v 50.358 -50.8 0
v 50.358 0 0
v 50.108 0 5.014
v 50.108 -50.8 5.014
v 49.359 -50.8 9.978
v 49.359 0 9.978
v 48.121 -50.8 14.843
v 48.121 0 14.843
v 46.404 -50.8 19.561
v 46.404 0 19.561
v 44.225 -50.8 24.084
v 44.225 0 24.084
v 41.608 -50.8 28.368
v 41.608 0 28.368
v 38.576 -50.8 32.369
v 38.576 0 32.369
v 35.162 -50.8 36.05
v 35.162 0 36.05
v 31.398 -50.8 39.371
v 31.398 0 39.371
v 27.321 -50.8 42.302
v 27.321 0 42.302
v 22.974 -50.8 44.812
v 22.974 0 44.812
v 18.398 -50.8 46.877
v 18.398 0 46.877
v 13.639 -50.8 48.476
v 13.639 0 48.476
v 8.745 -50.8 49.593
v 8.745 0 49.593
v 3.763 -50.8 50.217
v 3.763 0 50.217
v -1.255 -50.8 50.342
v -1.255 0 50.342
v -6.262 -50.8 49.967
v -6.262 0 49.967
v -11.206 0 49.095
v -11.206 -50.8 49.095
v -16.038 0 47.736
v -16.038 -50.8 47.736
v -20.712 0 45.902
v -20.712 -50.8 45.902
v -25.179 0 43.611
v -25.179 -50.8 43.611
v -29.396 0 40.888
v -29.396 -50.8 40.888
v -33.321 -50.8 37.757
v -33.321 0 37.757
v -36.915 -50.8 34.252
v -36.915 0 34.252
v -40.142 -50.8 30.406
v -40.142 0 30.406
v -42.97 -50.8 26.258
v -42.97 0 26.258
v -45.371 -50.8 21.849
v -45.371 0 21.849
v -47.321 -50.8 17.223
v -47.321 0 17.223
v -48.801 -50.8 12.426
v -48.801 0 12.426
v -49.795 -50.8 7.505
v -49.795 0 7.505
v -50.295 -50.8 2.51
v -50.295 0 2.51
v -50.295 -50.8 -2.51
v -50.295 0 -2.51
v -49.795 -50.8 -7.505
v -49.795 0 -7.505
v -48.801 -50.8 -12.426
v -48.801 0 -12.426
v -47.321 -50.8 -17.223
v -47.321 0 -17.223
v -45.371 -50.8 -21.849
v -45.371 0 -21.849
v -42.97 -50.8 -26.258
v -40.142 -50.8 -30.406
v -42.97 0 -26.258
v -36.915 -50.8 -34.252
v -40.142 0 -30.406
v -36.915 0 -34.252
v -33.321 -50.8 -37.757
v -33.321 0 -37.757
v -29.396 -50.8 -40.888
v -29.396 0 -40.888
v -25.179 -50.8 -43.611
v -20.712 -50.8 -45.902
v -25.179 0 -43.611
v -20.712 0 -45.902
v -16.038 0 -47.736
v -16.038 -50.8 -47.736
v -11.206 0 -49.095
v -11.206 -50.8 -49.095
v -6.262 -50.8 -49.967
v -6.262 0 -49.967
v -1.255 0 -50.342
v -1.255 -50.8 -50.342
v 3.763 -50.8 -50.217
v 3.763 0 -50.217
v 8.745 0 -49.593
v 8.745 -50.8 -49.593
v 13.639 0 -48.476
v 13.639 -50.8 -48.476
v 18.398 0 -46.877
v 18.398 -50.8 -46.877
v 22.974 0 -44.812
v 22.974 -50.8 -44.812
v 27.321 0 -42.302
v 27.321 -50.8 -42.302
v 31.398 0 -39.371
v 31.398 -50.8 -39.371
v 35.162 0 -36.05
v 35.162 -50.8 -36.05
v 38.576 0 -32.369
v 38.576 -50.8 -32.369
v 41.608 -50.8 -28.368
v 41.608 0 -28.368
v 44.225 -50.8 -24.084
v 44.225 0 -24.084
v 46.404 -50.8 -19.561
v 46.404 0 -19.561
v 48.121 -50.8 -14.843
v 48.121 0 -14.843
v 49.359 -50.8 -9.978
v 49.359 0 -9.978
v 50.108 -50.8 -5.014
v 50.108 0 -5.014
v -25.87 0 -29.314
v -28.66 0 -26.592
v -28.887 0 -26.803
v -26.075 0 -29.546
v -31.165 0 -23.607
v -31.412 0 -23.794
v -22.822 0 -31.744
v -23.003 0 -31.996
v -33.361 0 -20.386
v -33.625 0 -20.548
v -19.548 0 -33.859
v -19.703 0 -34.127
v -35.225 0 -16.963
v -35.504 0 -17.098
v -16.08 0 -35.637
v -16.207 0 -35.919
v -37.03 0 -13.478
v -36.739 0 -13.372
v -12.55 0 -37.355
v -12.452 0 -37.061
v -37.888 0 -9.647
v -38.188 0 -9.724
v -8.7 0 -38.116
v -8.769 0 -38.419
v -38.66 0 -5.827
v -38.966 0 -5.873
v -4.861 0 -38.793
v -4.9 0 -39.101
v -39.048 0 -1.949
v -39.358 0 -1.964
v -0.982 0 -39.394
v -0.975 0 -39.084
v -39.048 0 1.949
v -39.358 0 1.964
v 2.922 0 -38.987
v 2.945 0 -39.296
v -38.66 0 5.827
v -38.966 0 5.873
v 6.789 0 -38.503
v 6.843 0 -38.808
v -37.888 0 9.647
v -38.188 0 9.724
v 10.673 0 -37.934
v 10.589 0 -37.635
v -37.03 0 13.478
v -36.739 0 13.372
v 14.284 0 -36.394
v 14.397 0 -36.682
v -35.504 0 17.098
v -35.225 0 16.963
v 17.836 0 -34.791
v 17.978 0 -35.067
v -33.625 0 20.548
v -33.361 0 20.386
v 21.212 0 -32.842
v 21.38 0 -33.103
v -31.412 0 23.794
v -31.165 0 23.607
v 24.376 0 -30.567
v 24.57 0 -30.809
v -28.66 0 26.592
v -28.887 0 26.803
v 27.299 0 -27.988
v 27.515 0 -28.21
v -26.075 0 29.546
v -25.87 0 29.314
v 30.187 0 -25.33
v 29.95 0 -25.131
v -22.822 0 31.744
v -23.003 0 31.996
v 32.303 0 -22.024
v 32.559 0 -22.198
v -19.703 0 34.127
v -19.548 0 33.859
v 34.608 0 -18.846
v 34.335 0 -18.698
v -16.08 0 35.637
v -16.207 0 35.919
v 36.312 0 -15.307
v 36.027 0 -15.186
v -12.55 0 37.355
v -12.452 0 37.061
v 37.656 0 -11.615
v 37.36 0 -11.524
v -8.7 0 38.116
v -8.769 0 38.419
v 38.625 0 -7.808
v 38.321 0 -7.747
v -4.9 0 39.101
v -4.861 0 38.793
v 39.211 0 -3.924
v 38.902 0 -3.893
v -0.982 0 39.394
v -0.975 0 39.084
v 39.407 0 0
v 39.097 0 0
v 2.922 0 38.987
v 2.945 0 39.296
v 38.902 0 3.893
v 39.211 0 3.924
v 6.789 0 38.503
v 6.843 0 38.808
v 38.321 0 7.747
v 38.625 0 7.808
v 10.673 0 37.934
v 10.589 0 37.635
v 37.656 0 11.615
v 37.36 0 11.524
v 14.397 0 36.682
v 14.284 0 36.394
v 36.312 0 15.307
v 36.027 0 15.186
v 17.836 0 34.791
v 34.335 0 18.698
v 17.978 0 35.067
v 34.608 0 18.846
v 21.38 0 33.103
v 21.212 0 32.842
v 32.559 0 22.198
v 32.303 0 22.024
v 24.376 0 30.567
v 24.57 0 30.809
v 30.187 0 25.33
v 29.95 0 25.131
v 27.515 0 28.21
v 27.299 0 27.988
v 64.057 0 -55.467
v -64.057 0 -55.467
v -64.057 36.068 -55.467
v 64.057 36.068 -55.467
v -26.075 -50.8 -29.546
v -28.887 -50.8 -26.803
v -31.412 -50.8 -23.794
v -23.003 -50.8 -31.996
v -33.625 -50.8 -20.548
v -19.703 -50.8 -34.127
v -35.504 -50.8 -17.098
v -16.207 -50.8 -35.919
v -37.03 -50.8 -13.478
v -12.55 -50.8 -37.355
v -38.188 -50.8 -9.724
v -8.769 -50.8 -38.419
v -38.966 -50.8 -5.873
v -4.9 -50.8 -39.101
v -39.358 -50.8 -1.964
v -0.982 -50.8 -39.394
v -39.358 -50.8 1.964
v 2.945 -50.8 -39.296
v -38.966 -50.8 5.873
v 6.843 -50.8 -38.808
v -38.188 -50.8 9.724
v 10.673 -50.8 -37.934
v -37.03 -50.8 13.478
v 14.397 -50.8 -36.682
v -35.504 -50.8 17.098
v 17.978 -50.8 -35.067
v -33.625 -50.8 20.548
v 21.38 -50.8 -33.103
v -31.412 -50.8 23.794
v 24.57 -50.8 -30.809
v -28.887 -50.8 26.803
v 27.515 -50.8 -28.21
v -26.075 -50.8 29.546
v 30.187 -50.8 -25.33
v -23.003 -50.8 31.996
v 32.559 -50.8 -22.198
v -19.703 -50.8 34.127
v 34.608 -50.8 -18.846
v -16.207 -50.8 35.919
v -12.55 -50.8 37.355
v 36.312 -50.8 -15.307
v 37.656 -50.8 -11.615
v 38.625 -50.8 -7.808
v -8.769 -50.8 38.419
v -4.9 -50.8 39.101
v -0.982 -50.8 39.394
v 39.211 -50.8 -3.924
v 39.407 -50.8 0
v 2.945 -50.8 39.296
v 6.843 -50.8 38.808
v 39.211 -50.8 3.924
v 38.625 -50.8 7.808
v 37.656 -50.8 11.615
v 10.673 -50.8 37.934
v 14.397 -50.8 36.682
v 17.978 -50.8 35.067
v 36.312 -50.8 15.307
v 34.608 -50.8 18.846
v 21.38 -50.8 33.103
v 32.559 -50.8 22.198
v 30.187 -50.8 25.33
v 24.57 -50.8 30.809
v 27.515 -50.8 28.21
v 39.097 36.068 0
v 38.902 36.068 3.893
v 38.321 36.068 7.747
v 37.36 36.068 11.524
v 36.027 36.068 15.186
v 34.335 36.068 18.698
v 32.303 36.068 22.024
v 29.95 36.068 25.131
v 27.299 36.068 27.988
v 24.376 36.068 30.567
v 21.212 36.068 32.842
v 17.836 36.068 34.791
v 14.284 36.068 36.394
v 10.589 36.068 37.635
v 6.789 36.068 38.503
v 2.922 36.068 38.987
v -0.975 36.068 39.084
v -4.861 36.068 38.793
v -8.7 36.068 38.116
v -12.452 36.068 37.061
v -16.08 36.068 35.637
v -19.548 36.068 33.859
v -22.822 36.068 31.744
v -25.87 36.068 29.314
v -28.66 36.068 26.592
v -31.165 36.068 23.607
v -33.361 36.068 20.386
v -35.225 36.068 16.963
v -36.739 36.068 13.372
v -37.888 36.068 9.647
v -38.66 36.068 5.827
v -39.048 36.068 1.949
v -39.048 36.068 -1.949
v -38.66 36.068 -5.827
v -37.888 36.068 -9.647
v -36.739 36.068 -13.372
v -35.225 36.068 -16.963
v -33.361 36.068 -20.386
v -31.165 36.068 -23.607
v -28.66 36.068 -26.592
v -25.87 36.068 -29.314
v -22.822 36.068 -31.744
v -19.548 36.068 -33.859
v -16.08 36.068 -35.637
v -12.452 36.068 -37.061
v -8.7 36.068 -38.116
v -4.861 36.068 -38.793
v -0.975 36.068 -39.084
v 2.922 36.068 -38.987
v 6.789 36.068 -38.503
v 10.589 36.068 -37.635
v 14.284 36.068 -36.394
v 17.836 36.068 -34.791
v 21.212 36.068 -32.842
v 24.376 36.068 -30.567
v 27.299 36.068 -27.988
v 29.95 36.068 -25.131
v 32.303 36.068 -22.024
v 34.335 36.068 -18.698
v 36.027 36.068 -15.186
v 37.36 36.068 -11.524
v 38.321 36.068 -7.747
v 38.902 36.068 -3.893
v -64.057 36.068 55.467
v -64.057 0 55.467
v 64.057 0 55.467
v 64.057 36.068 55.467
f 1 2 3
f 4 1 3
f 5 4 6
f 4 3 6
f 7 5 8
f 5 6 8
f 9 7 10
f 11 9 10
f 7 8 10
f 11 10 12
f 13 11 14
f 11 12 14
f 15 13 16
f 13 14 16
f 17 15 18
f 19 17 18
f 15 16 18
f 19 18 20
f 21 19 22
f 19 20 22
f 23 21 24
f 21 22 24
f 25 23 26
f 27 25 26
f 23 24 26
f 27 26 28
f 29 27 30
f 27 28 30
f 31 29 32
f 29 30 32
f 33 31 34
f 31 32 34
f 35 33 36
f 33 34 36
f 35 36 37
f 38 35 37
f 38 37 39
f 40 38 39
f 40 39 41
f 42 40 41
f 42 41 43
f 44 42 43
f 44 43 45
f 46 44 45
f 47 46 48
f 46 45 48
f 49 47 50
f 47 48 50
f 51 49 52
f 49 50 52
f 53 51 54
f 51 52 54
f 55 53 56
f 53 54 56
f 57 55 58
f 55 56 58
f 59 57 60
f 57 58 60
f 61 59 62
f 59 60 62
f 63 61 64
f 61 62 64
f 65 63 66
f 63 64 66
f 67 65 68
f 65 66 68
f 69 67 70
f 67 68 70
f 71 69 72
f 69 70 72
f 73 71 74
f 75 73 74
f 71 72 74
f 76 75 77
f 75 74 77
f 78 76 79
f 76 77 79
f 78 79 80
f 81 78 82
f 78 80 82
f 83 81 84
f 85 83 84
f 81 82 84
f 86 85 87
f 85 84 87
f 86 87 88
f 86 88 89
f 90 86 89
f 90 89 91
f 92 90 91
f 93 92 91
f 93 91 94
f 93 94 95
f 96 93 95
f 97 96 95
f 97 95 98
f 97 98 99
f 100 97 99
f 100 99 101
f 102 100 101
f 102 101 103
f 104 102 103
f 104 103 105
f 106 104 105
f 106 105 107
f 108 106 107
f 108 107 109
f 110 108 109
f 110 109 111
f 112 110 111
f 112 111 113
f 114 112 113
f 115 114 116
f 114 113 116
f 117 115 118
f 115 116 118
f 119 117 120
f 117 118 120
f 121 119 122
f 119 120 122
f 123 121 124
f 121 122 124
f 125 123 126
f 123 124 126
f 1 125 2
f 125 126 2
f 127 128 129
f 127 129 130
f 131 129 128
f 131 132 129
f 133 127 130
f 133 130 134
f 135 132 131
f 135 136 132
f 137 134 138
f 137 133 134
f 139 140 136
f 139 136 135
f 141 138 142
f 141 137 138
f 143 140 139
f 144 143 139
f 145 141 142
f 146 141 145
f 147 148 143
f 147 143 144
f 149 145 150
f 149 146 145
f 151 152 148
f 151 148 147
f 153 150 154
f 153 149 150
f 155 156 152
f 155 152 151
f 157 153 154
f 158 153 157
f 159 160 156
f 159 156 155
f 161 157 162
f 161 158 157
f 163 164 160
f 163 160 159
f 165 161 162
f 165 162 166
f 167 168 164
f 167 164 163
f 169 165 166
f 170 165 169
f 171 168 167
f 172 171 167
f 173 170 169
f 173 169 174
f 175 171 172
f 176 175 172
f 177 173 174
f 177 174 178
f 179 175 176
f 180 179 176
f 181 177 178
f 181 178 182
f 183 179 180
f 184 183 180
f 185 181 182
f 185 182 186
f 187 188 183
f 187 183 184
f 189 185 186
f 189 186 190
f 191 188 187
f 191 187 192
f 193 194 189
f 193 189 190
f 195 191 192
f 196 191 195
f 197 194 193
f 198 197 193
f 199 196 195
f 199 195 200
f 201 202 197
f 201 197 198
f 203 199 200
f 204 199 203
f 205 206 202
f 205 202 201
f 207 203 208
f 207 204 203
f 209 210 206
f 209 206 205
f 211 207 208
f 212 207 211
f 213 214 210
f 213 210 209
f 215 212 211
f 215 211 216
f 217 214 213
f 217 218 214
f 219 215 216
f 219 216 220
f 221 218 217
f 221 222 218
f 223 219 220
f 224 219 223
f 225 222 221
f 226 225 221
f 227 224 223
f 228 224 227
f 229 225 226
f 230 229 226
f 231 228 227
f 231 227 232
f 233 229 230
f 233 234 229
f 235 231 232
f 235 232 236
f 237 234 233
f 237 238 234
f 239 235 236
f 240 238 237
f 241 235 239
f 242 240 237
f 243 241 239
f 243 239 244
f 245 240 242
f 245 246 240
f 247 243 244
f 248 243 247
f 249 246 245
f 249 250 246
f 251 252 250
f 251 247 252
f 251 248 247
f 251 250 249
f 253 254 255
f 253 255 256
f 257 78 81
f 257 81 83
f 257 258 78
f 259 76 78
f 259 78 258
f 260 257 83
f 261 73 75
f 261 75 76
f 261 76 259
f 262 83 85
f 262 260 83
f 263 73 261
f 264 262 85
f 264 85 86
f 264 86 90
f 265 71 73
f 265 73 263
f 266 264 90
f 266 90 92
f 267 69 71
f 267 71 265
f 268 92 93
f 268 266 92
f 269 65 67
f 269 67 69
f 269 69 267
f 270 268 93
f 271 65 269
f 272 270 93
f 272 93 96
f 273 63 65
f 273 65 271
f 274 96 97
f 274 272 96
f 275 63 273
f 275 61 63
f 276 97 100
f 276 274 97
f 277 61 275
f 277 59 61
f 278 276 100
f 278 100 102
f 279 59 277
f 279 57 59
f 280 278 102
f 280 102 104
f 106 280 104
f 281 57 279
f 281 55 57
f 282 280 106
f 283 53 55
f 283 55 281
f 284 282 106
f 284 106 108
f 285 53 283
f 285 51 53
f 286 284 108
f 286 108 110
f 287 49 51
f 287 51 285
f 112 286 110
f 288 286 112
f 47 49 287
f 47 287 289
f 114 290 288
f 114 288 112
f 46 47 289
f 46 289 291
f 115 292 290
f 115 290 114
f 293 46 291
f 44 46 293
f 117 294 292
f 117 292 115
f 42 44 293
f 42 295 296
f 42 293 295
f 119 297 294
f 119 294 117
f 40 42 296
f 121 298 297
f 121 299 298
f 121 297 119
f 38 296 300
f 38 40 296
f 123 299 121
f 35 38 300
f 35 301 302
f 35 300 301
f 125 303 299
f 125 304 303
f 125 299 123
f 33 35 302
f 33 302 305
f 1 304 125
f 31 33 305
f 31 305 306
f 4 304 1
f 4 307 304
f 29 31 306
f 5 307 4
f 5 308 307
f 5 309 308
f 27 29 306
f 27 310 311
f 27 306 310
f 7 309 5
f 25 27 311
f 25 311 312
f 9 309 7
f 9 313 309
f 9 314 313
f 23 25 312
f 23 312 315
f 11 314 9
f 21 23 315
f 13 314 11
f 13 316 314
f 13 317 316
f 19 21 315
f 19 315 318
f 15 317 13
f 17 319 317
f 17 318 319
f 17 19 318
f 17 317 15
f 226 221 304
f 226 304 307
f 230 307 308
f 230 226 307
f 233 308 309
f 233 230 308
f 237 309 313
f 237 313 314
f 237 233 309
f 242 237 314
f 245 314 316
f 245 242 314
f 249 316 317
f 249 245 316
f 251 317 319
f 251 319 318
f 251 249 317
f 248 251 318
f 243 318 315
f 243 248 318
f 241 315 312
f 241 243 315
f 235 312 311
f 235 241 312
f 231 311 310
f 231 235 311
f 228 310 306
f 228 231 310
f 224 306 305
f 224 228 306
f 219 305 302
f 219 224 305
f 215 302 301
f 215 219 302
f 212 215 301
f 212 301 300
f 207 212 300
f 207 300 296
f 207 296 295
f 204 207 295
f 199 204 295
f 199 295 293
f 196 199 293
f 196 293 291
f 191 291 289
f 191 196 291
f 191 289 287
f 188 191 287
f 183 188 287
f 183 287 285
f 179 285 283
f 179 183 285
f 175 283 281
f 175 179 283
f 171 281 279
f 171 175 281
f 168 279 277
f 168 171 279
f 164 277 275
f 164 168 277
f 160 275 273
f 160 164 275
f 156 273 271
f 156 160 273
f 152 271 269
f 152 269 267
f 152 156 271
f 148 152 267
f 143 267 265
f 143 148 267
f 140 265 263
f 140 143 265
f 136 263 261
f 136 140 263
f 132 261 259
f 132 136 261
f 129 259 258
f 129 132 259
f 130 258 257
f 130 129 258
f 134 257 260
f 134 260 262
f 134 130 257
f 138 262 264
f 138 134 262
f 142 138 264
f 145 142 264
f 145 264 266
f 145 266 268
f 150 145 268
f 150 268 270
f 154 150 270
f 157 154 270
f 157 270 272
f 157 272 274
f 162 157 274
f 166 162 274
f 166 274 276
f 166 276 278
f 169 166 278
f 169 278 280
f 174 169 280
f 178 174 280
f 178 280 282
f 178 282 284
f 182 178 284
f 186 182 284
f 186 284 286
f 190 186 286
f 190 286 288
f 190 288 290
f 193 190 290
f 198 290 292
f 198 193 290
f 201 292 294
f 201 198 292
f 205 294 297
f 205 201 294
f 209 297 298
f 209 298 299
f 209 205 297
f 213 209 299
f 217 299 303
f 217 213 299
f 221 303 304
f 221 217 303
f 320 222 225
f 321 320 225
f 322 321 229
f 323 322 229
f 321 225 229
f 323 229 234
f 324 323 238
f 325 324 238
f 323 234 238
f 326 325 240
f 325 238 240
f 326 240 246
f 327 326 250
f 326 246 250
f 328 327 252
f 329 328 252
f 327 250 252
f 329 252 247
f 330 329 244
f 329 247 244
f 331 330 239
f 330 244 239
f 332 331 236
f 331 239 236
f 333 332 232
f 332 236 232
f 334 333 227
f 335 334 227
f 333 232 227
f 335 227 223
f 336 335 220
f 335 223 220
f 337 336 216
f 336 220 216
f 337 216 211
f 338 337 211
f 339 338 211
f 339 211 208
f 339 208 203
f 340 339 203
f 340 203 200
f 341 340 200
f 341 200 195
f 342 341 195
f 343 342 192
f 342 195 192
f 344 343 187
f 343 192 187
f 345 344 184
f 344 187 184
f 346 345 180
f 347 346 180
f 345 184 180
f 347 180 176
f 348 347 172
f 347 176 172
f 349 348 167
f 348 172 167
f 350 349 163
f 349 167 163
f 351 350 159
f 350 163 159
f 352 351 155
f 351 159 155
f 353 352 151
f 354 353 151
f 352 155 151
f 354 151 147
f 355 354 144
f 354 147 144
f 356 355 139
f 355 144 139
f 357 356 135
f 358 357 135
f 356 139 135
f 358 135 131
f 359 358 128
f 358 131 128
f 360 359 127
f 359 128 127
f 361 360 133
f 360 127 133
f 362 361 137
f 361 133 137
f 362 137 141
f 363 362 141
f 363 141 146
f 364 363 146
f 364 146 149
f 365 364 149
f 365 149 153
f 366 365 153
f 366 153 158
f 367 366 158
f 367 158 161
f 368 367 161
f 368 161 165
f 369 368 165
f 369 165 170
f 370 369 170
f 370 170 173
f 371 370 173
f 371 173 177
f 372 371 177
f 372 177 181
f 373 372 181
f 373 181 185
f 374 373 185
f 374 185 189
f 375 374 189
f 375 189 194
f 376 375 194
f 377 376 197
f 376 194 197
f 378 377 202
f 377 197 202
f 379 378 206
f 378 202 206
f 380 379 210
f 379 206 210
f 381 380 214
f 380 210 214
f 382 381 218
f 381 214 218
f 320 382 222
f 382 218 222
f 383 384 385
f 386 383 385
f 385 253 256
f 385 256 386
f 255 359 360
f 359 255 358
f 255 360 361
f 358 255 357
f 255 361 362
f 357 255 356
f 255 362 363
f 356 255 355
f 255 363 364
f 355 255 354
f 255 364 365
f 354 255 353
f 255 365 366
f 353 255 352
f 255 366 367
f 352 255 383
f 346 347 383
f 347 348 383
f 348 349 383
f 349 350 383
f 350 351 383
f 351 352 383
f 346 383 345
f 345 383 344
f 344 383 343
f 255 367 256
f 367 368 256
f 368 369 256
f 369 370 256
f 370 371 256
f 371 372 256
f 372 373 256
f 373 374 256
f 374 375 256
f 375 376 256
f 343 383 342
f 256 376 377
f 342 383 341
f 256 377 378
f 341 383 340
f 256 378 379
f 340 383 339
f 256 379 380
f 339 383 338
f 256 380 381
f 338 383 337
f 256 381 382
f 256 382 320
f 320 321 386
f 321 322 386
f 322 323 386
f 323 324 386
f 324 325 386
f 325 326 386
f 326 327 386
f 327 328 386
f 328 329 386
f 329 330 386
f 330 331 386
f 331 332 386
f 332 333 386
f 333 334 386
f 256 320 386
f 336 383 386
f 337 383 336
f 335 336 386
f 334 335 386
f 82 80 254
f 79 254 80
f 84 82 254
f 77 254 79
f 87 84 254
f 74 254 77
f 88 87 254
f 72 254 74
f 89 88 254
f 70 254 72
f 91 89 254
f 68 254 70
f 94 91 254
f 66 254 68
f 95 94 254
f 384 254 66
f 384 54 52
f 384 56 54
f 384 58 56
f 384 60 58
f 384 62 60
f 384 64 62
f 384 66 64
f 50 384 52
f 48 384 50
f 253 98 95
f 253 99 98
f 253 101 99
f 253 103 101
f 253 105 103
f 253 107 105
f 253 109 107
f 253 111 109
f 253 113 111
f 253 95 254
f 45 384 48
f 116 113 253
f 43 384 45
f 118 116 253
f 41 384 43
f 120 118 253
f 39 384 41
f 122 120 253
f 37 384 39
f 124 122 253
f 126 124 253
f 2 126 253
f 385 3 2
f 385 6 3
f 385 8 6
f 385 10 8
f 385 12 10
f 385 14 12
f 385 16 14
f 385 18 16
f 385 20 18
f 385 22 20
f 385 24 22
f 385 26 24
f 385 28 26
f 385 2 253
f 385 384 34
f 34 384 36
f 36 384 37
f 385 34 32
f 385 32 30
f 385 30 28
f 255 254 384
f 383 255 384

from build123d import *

# Parameters (mm, degrees)
F0_W     = 128.114178
F0_H     = 110.934116
F0_R     = 39.096531
F1_DEPTH = 36.068
F2_R     = 50.357912
F2_R_2   = 39.406524
F3_DEPTH = 50.8


with BuildPart() as f1:
    # F0 (on Front) → F1 (new body)
    with BuildSketch(Plane.XZ):
        Rectangle(F0_W, F0_H)
        Circle(F0_R, mode=Mode.SUBTRACT)
    extrude(amount=-F1_DEPTH)

    # F2 (on Front) → F3 (join)
    with BuildSketch(Plane.XZ):
        Circle(F2_R)
        Circle(F2_R_2, mode=Mode.SUBTRACT)
    extrude(amount=F3_DEPTH)


solid = f1.part
